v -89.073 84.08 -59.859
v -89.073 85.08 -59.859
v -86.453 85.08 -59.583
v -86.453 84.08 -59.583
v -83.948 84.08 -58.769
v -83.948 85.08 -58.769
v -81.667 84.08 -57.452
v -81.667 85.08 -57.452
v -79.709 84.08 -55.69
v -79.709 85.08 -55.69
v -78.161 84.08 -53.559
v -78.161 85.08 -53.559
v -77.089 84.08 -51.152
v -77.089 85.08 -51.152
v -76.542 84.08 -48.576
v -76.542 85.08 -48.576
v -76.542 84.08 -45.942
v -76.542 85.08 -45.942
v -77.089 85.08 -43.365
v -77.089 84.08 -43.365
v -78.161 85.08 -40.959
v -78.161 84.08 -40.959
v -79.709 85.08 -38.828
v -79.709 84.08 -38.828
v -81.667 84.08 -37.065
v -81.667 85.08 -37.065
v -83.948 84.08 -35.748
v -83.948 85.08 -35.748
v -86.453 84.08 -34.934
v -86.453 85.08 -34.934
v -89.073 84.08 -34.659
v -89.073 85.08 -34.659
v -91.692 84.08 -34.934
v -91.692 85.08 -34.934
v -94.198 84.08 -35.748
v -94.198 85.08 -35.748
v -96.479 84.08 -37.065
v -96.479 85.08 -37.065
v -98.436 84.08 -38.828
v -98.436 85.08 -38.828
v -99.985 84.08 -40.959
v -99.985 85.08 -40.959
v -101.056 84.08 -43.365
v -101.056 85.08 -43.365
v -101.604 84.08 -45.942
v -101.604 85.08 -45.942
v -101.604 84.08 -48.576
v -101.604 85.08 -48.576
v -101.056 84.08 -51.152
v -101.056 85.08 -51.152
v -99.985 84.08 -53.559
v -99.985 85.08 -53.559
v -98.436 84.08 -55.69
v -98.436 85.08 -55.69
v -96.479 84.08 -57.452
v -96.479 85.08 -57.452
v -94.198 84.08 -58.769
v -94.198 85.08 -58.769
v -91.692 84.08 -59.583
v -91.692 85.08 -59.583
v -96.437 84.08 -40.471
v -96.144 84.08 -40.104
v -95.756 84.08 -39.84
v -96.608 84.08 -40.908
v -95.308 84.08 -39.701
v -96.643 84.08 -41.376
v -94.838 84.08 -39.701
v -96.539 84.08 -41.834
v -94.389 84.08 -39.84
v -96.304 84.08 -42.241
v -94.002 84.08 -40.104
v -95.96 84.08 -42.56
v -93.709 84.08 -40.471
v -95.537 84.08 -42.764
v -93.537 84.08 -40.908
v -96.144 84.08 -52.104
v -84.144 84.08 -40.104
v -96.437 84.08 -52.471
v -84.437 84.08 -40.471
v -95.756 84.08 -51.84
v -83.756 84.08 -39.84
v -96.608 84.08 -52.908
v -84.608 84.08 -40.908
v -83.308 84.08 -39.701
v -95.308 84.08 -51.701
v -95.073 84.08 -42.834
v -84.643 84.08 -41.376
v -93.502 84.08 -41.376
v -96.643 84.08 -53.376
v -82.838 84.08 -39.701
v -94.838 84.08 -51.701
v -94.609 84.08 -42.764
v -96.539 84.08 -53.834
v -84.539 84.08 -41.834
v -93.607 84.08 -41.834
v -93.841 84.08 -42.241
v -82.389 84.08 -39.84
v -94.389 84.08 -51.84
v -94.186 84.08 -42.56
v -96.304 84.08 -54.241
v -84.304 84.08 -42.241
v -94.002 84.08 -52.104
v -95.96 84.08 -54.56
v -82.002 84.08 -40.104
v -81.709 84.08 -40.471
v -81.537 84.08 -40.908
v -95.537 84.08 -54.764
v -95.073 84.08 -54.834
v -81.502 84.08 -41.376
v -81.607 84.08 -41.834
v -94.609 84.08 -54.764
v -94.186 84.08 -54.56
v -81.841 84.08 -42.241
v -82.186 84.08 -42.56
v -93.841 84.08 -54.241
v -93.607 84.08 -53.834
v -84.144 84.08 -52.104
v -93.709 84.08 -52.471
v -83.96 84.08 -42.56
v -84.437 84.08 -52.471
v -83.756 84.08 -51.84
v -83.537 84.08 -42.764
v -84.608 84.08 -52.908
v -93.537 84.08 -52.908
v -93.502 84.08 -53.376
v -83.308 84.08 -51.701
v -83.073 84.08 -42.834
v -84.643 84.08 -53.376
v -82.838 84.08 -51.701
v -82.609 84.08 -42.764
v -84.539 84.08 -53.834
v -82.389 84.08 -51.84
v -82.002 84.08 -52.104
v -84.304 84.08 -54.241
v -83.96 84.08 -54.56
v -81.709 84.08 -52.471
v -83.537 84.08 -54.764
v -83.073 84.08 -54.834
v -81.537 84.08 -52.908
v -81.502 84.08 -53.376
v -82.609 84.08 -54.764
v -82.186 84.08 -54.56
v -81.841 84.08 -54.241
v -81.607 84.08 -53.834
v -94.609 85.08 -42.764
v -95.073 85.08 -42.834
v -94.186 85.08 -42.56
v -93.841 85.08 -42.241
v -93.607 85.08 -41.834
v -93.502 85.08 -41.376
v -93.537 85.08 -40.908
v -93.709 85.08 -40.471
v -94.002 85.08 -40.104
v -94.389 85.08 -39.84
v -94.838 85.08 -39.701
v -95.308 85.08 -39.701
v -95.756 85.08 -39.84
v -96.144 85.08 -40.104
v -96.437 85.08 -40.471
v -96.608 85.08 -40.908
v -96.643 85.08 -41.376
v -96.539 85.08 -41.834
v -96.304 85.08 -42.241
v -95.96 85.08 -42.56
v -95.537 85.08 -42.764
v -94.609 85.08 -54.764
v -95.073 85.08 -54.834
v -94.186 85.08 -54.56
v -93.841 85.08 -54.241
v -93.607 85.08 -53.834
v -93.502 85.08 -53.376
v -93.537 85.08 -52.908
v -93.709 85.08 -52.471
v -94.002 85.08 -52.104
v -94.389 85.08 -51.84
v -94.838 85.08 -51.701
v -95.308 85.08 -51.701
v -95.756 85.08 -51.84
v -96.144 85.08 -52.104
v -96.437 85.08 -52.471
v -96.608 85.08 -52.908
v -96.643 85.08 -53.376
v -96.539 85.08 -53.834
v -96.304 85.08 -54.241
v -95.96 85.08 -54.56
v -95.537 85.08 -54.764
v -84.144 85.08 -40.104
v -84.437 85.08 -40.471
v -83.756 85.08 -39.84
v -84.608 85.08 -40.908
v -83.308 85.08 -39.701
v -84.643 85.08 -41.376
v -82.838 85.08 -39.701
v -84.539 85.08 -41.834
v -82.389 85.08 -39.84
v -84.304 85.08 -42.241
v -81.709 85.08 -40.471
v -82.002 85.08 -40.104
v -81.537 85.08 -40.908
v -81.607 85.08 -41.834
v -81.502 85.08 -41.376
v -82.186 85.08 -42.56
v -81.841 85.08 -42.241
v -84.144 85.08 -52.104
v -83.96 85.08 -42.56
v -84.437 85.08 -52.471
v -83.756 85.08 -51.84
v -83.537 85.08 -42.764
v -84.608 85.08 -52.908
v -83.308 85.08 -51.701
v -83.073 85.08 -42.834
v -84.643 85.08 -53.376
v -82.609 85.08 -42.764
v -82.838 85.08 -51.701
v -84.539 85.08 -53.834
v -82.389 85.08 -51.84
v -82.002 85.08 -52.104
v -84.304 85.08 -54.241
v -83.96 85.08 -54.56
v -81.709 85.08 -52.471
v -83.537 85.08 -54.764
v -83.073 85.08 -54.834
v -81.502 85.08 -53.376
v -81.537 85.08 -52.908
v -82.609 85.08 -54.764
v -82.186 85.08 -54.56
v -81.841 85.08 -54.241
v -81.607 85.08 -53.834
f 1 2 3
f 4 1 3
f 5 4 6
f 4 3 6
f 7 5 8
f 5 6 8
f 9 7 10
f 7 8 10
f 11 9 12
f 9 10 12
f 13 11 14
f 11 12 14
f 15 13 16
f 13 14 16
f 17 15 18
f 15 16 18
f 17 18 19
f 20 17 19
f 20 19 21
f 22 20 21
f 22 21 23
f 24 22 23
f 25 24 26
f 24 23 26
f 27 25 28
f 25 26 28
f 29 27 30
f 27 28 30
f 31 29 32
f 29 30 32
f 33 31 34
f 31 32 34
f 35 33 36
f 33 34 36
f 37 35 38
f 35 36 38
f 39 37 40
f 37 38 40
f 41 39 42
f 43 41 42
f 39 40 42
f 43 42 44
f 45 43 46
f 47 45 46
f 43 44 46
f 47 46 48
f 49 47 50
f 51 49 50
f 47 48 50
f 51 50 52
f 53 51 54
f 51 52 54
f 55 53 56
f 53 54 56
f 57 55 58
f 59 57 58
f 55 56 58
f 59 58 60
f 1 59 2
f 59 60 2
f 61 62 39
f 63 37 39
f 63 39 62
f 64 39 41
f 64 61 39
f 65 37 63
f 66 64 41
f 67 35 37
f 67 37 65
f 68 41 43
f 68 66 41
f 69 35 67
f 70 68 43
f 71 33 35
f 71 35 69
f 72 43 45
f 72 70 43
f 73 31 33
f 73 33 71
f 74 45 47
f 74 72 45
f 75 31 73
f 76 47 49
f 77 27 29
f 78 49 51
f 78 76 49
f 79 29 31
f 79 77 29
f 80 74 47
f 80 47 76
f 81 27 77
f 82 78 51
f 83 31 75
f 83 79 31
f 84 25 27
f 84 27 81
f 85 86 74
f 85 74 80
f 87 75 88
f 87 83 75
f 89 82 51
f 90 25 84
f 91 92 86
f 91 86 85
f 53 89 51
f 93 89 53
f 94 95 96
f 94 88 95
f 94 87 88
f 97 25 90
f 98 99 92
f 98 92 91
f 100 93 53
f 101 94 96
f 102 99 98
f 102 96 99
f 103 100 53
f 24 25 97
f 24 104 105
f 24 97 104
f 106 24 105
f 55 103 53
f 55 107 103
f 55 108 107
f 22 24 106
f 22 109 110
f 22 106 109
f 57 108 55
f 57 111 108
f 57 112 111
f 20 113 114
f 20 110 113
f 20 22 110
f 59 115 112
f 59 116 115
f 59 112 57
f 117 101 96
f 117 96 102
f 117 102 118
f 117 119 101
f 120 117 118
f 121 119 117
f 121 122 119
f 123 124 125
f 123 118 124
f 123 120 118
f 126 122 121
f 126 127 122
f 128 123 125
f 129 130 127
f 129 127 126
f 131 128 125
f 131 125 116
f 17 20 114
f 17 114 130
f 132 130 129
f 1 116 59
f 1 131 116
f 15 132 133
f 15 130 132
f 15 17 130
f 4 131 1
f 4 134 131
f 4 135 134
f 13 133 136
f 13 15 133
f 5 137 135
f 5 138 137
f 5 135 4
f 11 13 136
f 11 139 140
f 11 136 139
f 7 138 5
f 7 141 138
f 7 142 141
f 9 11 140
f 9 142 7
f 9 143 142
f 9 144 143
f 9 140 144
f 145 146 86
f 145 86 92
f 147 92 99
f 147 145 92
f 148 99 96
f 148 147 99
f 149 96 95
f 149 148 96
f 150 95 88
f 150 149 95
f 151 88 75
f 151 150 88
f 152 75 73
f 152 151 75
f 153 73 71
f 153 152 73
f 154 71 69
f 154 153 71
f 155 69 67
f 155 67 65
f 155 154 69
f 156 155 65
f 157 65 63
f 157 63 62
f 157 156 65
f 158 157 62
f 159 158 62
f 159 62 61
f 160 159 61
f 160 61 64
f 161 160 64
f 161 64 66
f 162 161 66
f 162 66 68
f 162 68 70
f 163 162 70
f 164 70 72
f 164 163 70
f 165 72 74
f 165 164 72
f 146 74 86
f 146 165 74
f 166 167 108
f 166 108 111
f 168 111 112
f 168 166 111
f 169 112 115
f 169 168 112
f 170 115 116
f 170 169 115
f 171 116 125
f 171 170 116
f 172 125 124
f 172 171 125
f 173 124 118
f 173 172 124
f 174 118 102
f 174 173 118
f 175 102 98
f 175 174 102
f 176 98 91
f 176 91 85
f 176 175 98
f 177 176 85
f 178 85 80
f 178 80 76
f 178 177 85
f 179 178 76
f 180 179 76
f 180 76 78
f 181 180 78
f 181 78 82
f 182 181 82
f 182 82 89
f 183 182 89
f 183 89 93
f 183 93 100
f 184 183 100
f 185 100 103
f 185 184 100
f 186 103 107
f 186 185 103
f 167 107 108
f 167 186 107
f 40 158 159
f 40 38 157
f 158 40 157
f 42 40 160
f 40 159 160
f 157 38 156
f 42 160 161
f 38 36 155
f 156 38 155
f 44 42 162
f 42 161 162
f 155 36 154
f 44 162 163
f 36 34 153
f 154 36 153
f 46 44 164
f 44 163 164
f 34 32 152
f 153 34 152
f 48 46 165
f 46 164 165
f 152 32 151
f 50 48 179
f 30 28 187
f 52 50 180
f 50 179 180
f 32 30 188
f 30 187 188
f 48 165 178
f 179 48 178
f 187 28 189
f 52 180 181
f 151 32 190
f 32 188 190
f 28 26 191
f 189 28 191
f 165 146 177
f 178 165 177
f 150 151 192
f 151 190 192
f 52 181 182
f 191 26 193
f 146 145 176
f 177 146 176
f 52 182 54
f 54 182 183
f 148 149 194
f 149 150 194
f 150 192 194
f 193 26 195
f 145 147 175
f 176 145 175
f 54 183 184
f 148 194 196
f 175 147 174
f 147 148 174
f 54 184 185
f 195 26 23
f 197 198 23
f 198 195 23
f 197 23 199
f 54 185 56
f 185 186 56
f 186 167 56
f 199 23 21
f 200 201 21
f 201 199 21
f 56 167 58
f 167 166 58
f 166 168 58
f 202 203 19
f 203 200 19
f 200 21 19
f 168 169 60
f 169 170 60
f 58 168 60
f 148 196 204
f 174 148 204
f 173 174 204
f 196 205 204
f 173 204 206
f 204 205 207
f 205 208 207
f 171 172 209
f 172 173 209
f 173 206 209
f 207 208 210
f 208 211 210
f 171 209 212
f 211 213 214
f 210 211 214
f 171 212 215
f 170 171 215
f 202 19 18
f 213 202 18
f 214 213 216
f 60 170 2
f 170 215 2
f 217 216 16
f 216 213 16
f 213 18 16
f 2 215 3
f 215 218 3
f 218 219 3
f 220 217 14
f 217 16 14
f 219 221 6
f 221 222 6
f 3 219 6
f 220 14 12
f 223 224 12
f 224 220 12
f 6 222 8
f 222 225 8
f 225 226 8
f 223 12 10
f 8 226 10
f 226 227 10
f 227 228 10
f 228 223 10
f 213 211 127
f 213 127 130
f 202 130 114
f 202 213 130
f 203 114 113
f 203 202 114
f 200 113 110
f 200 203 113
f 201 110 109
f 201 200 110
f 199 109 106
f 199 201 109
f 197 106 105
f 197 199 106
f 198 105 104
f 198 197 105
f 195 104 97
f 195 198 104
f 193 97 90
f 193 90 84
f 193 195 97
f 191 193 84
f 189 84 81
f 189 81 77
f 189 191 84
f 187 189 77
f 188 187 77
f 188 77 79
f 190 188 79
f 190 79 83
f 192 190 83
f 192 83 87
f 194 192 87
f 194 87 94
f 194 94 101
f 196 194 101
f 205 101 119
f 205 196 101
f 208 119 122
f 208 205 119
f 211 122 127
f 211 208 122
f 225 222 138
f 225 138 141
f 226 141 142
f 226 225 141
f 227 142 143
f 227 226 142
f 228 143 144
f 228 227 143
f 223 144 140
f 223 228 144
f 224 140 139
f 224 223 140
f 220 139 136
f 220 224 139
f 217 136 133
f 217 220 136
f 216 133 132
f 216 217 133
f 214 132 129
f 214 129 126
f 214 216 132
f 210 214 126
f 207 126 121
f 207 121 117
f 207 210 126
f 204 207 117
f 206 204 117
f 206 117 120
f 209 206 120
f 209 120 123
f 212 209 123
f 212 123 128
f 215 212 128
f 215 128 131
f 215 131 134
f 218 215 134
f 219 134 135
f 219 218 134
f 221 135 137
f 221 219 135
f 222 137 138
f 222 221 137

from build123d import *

# Parameters (mm, degrees)
SKETCH1_R           = 12.6
SKETCH1_R_2         = 1.575
BOSS_EXTRUDE1_DEPTH = 1


with BuildPart() as part:
    # Sketch1 → Boss-Extrude1 (new body)
    with BuildSketch(Plane.XZ.offset(-85.080072415)):
        with Locations(Location((-89.072792821, -47.25870832, 0), (0, 0, 270))):
            Circle(SKETCH1_R)
        with Locations(Location((-95.072792821, -41.25870832, 0), (0, 0, 270))):
            Circle(SKETCH1_R_2, mode=Mode.SUBTRACT)
        with Locations(Location((-83.072792821, -41.25870832, 0), (0, 0, 270))):
            Circle(SKETCH1_R_2, mode=Mode.SUBTRACT)
        with Locations(Location((-83.072792821, -53.25870832, 0), (0, 0, 270))):
            Circle(SKETCH1_R_2, mode=Mode.SUBTRACT)
        with Locations(Location((-95.072792821, -53.25870832, 0), (0, 0, 270))):
            Circle(SKETCH1_R_2, mode=Mode.SUBTRACT)
    extrude(amount=BOSS_EXTRUDE1_DEPTH)


solid = part.part
